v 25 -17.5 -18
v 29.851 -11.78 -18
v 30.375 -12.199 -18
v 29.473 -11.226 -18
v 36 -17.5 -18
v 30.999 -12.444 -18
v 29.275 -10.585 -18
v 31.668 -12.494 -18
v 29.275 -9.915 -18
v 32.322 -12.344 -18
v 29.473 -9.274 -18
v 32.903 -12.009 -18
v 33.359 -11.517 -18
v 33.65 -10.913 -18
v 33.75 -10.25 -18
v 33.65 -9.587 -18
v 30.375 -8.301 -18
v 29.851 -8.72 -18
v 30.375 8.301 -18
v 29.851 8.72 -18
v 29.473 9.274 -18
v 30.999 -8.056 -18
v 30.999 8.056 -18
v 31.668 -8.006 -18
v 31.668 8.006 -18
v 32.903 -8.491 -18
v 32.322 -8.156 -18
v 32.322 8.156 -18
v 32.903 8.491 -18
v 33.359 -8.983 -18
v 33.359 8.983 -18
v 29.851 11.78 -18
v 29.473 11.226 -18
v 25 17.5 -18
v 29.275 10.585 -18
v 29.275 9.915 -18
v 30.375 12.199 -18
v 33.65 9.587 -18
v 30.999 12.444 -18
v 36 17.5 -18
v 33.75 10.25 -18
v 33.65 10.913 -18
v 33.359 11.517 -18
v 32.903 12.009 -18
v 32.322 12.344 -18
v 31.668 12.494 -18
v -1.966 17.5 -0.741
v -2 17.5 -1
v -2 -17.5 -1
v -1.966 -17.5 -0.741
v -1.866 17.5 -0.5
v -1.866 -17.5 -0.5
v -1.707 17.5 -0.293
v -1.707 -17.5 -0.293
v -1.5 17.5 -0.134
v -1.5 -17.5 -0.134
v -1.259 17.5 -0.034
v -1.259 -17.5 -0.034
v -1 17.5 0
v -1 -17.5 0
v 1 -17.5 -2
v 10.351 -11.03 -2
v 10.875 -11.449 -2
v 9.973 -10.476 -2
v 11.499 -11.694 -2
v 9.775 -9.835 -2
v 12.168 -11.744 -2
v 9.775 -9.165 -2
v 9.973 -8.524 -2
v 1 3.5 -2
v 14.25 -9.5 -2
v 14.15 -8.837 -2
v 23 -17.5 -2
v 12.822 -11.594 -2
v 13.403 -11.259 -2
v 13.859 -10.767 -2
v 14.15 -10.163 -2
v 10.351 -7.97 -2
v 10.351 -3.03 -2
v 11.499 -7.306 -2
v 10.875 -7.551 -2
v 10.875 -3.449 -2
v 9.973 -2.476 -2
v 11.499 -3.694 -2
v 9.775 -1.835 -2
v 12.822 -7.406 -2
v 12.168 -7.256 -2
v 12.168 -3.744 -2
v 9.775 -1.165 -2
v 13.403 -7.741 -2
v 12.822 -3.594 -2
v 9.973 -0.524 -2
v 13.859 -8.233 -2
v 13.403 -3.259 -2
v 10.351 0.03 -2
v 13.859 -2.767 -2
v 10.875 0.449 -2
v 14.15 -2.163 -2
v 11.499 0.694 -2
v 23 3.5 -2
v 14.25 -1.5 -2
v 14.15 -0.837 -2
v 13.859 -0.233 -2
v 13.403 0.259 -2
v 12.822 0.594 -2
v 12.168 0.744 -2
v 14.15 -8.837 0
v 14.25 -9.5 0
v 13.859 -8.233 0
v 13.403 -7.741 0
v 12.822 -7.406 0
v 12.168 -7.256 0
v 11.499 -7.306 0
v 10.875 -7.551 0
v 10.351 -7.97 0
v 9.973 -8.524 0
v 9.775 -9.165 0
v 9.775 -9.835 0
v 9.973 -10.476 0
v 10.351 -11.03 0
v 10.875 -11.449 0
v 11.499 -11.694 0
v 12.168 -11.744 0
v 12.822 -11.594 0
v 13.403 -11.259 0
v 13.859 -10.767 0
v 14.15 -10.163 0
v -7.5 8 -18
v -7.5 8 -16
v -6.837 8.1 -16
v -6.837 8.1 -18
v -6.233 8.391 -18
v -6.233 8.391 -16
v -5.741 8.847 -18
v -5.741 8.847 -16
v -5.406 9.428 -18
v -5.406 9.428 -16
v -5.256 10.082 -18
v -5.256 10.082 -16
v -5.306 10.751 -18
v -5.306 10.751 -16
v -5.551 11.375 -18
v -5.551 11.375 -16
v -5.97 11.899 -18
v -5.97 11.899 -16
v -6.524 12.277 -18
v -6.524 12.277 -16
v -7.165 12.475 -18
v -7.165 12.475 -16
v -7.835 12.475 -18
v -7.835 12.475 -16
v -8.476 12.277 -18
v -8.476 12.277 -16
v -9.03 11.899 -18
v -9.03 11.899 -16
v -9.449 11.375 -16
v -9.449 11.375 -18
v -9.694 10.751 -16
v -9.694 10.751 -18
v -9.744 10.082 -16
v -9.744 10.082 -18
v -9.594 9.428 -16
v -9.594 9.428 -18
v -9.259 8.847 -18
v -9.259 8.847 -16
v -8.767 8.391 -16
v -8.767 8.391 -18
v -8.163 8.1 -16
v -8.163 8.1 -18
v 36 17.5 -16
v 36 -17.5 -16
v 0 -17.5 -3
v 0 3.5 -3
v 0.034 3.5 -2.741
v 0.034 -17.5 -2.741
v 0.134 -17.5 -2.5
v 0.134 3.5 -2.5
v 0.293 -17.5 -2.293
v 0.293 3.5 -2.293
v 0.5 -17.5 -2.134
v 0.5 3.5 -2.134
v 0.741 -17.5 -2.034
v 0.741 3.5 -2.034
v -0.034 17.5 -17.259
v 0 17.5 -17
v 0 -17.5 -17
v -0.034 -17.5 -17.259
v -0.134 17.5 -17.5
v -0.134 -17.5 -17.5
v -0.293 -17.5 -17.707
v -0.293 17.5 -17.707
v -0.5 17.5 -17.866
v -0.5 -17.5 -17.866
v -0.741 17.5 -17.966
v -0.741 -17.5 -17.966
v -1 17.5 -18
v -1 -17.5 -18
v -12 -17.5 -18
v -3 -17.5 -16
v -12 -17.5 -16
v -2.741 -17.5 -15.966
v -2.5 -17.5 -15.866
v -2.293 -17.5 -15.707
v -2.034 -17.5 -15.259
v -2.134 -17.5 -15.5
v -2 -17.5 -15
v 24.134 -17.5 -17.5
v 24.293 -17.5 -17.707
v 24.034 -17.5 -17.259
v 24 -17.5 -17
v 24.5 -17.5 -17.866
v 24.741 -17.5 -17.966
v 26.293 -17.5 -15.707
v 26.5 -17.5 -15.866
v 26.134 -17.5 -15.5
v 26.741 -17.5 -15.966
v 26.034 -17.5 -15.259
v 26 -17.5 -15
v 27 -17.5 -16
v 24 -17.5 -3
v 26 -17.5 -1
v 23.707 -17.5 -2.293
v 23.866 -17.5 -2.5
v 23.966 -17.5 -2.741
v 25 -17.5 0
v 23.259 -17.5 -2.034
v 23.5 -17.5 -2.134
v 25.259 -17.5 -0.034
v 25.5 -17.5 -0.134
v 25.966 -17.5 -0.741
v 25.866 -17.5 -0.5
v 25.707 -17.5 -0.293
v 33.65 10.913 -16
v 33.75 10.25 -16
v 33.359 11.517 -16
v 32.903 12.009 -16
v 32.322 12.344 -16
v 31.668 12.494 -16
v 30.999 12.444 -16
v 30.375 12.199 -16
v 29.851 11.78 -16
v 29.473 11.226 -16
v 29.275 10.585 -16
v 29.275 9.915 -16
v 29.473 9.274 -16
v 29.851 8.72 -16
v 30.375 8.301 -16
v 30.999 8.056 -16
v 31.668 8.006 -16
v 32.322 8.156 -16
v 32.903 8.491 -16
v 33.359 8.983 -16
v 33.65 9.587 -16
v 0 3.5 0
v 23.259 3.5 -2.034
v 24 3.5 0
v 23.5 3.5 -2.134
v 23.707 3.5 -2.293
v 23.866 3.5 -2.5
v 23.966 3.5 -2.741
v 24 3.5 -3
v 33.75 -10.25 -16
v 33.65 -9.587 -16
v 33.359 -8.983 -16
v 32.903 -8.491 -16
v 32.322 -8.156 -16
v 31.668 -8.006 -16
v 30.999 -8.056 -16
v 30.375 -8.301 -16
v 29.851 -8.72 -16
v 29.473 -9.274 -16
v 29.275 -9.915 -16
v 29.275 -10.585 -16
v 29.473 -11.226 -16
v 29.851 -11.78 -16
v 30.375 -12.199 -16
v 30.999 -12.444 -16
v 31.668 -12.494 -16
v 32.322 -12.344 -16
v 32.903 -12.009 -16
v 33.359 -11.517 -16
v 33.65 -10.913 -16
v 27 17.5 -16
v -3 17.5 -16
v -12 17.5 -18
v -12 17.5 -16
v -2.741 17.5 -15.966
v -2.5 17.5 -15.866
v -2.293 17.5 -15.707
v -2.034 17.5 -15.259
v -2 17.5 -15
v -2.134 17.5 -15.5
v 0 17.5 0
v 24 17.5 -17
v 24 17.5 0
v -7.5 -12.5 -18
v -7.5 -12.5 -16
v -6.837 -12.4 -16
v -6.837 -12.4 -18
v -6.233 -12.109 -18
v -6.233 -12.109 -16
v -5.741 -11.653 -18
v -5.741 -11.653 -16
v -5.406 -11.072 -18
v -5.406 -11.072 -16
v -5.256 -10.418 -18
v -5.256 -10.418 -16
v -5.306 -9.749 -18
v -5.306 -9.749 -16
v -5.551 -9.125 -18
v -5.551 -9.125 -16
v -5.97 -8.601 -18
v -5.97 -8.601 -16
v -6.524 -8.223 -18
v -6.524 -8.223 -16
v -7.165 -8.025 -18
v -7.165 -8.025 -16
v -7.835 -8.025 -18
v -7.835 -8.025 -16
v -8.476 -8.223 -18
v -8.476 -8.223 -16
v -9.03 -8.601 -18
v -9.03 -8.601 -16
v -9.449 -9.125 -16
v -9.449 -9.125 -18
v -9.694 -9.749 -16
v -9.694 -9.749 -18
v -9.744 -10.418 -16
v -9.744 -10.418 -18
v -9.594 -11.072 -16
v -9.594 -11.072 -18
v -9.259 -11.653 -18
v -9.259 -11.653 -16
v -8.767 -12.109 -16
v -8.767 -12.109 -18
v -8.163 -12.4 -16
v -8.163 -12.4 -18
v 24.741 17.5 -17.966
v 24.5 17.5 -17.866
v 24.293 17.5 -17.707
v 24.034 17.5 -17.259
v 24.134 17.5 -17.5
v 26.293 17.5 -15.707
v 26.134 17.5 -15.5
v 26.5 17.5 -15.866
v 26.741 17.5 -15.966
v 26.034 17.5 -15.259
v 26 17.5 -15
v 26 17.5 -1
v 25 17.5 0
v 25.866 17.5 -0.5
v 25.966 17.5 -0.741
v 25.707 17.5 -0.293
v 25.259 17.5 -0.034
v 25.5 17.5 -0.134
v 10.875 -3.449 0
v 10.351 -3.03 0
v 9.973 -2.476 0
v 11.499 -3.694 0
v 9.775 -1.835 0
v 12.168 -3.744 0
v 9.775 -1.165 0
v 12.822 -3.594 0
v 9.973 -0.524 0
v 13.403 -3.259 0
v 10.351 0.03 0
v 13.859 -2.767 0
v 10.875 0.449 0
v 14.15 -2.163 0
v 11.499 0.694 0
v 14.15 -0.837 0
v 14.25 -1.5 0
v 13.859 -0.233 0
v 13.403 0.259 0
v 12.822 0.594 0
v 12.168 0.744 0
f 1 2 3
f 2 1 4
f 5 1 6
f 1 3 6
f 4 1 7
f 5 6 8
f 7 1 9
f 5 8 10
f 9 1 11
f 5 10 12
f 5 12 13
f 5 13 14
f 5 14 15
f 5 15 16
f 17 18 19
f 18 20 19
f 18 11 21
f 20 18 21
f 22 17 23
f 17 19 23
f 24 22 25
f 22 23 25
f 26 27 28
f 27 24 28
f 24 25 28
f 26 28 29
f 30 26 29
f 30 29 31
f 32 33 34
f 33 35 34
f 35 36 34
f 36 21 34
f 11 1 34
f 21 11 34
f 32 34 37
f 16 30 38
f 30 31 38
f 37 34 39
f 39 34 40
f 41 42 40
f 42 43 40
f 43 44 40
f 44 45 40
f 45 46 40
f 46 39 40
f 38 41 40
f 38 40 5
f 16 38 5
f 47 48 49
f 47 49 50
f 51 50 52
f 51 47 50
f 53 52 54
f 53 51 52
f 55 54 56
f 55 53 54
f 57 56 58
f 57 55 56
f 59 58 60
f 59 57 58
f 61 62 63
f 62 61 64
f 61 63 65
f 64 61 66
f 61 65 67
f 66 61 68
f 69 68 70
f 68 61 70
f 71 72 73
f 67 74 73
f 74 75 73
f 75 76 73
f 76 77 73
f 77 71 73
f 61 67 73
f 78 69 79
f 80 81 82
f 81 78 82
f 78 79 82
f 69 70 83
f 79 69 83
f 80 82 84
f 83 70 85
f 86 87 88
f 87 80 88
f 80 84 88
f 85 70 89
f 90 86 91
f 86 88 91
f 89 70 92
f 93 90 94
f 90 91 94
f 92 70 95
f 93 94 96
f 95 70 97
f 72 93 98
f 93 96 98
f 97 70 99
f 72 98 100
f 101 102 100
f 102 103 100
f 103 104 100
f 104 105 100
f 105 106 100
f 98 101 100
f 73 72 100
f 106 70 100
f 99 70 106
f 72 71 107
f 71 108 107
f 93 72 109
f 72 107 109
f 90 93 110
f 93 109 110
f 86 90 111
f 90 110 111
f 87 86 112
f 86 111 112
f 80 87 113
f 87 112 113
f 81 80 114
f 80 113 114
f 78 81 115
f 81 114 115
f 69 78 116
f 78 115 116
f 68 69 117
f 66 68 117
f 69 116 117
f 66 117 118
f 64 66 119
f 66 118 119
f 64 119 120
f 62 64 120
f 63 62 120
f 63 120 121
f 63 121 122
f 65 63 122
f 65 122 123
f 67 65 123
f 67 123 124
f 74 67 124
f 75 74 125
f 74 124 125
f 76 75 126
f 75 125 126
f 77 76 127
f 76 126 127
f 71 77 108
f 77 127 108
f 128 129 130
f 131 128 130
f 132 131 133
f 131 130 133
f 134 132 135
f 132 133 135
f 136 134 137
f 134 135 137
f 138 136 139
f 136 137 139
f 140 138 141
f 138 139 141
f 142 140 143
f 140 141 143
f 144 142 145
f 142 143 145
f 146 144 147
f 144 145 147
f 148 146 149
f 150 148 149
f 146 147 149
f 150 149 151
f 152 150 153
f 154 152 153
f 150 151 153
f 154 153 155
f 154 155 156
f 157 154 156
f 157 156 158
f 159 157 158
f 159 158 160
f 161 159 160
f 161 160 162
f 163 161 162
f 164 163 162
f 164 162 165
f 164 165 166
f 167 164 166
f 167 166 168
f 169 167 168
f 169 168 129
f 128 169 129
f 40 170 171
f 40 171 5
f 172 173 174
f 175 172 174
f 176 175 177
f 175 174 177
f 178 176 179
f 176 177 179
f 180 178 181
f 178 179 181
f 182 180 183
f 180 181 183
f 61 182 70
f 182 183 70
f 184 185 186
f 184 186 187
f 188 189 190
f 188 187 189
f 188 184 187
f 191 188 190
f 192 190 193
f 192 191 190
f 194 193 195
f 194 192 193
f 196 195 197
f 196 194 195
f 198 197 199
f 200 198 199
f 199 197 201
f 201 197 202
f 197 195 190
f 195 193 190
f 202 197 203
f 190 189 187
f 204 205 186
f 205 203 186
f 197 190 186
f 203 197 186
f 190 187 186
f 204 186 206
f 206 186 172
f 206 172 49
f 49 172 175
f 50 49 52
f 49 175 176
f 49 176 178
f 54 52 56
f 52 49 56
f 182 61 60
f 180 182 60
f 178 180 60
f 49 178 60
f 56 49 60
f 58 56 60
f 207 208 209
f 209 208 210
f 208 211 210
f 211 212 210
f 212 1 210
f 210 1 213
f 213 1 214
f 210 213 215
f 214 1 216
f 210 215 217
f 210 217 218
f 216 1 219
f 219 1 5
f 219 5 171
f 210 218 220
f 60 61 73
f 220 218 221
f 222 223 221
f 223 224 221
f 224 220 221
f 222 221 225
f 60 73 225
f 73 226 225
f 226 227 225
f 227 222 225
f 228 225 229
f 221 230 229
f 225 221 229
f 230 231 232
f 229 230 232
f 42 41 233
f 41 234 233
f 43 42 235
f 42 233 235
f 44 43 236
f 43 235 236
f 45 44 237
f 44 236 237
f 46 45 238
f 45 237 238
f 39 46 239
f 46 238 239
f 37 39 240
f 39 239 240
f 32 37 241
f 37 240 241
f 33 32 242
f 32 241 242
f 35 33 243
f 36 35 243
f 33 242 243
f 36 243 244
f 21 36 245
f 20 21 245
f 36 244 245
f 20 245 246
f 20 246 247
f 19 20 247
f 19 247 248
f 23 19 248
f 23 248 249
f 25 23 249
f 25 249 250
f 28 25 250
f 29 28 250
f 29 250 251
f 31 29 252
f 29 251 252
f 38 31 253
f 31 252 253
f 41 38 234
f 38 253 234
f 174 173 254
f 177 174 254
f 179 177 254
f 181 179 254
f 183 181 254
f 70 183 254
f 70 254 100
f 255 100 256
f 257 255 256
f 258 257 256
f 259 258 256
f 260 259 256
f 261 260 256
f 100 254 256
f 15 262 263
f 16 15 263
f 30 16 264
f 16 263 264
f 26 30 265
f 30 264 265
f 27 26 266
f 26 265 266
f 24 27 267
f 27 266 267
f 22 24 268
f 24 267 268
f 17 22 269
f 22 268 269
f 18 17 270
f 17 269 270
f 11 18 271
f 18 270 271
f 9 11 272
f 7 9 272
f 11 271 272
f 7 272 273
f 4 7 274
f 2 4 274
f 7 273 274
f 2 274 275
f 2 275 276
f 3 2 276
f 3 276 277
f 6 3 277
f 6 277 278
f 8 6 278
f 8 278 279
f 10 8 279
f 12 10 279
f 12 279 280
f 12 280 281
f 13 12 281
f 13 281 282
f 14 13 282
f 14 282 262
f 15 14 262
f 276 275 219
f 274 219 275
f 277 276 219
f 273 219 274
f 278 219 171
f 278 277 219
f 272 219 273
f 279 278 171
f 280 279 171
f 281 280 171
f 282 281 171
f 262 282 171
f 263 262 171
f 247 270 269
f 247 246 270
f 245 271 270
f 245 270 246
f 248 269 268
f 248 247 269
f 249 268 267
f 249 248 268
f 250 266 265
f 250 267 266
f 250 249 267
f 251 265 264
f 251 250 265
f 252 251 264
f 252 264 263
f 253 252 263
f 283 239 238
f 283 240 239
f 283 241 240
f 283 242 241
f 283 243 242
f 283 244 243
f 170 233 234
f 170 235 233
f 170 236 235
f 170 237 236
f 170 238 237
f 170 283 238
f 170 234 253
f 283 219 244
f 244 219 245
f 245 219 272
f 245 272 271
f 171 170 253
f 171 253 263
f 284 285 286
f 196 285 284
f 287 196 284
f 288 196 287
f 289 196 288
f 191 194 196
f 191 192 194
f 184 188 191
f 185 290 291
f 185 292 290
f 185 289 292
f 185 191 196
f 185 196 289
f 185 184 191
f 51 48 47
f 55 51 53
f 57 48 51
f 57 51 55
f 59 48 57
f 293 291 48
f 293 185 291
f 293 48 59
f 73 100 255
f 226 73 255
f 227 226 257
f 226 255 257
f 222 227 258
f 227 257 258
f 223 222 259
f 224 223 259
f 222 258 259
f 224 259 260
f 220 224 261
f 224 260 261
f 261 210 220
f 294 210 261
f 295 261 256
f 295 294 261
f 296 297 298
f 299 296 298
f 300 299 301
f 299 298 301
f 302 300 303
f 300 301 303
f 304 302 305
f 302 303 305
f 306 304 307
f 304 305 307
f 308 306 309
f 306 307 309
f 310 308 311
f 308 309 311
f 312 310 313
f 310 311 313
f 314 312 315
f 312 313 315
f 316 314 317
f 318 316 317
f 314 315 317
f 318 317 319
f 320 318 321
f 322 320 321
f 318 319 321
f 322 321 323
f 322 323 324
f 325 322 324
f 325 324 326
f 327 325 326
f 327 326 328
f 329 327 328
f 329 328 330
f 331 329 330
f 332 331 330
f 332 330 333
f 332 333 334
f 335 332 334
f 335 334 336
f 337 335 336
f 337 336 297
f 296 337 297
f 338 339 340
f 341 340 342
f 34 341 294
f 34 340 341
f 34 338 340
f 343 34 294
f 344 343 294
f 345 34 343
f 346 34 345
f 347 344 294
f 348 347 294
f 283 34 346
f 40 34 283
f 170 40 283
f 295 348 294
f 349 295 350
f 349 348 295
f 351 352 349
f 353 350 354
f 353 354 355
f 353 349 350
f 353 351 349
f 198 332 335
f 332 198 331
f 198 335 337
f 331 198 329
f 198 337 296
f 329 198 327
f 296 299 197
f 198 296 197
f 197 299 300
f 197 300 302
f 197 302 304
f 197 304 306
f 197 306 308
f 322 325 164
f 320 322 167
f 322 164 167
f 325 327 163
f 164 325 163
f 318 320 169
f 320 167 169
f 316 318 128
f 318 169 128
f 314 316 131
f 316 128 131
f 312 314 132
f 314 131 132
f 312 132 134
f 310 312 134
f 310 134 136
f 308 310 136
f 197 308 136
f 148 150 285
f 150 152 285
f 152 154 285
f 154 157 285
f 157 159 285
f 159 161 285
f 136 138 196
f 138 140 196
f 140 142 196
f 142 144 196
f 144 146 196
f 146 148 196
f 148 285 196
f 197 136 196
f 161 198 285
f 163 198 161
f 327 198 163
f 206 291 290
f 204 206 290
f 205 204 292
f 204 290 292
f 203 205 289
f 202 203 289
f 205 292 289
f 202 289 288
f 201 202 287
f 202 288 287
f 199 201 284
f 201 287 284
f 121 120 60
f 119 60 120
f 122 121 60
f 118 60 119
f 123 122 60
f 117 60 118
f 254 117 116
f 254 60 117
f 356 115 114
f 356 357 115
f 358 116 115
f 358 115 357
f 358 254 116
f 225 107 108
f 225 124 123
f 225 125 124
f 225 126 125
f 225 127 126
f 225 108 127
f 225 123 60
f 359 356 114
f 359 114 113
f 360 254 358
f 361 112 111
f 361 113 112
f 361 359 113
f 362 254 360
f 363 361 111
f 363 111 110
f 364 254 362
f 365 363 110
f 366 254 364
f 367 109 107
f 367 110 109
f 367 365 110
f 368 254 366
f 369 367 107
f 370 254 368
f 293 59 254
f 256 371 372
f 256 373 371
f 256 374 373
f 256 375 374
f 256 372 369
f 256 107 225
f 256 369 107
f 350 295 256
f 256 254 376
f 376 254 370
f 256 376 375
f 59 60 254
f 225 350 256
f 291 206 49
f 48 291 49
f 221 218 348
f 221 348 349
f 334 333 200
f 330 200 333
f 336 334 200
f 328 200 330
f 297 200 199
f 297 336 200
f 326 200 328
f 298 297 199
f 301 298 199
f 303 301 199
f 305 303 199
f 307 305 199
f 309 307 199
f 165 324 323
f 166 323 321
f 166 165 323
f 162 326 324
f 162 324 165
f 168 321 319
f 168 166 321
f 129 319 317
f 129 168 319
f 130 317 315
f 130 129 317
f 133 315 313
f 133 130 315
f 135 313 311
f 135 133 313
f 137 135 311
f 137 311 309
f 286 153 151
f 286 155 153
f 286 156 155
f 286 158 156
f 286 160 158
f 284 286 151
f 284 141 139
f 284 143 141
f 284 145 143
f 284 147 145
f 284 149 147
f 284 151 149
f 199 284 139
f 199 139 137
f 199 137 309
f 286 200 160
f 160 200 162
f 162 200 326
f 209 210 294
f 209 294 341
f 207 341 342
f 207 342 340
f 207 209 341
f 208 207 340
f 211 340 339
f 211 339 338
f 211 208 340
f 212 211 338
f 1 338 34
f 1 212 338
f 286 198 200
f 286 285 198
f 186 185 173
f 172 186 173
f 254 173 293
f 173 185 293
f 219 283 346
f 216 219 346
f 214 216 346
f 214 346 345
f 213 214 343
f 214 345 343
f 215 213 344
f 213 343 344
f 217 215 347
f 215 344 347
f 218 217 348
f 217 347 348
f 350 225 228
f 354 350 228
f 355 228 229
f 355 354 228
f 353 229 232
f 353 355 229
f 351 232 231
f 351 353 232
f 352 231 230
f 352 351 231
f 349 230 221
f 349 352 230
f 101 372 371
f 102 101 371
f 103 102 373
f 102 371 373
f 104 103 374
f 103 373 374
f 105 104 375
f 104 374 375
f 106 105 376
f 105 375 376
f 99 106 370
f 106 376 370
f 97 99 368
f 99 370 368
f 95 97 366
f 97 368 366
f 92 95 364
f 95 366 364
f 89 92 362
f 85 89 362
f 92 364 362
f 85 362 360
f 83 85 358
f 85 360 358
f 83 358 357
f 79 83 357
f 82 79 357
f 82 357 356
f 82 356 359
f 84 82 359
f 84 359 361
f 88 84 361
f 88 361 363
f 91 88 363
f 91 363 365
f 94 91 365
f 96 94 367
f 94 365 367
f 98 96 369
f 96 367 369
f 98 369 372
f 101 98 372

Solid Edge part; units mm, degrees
sketch "Sketch1" plane through (0, 0, 0) normal (0, -1, 0) x (1, 0, 0)
  line L0 (24, -18) -> (24, -2)
  line L1 (0, -2) -> (24, -2)
  line L2 (0, -18) -> (0, -2)
  line L3 (-2, -18) -> (0, -18)
  line L4 (-2, -18) -> (-12, -18)
  line L5 (-12, -18) -> (-12, -16)
  line L6 (-12, -16) -> (-2, -16)
  line L7 (-2, -16) -> (-2, 0)
  line L8 (-2, 0) -> (26, 0)
  line L9 (26, -16) -> (26, 0)
  line L10 (26, -16) -> (36, -16)
  line L11 (36, -16) -> (36, -18)
  line L12 (24, -18) -> (36, -18)
extrude "Protrusion1" add sketch "Sketch1" along normal mid plane 35
fillet "CurvePart" radius 1 1 edges at (26, 0, 0)
fillet "CurvePart2" radius 1 1 edges at (-2, 0, 0)
fillet "CurvePart3" radius 1 1 edges at (-2, 0, -16)
fillet "CurvePart4" radius 1 1 edges at (0, 0, -18)
fillet "CurvePart5" radius 1 1 edges at (24, 0, -18)
fillet "CurvePart6" radius 1 1 edges at (26, 0, -16)
fillet "CurvePart7" radius 1 1 edges at (0, 0, -2)
fillet "CurvePart8" radius 1 1 edges at (24, 0, -2)
sketch "Sketch2" plane through (12, 0, 0) normal (0, 0, 1) x (0, -1, 0)
  line L0 (-17.5, -12) -> (-3.5, -12)
  line L1 (-3.5, -12) -> (-3.5, 12)
  line L2 (-3.5, 12) -> (-17.5, 12)
  line L3 (-17.5, 12) -> (-17.5, -12)
extrude "CutOffTopPart" cut sketch "Sketch2" against normal blind 4
sketch "Sketch3" plane through (-7.5, 0, -16) normal (0, 0, 1) x (0, -1, 0)
  circle A0 centre (-10.25, 0) radius 2.25
  circle A1 centre (10.25, 0) radius 2.25
extrude "v_2Holes_Left" cut sketch "Sketch3" against normal blind 2
sketch "Sketch4" plane through (31.5, 0, -16) normal (0, 0, 1) x (1, 0, 0)
  circle A0 centre (0, -10.25) radius 2.25
  circle A1 centre (0, 10.25) radius 2.25
extrude "v_2Holes_Right" cut sketch "Sketch4" against normal blind 2
sketch "Sketch5" plane through (12, 0, 0) normal (0, 0, 1) x (1, 0, 0)
  circle A0 centre (0, -1.5) radius 2.25
  circle A1 centre (0, -9.5) radius 2.25
extrude "v_2Holes_Middle" cut sketch "Sketch5" against normal blind 2
